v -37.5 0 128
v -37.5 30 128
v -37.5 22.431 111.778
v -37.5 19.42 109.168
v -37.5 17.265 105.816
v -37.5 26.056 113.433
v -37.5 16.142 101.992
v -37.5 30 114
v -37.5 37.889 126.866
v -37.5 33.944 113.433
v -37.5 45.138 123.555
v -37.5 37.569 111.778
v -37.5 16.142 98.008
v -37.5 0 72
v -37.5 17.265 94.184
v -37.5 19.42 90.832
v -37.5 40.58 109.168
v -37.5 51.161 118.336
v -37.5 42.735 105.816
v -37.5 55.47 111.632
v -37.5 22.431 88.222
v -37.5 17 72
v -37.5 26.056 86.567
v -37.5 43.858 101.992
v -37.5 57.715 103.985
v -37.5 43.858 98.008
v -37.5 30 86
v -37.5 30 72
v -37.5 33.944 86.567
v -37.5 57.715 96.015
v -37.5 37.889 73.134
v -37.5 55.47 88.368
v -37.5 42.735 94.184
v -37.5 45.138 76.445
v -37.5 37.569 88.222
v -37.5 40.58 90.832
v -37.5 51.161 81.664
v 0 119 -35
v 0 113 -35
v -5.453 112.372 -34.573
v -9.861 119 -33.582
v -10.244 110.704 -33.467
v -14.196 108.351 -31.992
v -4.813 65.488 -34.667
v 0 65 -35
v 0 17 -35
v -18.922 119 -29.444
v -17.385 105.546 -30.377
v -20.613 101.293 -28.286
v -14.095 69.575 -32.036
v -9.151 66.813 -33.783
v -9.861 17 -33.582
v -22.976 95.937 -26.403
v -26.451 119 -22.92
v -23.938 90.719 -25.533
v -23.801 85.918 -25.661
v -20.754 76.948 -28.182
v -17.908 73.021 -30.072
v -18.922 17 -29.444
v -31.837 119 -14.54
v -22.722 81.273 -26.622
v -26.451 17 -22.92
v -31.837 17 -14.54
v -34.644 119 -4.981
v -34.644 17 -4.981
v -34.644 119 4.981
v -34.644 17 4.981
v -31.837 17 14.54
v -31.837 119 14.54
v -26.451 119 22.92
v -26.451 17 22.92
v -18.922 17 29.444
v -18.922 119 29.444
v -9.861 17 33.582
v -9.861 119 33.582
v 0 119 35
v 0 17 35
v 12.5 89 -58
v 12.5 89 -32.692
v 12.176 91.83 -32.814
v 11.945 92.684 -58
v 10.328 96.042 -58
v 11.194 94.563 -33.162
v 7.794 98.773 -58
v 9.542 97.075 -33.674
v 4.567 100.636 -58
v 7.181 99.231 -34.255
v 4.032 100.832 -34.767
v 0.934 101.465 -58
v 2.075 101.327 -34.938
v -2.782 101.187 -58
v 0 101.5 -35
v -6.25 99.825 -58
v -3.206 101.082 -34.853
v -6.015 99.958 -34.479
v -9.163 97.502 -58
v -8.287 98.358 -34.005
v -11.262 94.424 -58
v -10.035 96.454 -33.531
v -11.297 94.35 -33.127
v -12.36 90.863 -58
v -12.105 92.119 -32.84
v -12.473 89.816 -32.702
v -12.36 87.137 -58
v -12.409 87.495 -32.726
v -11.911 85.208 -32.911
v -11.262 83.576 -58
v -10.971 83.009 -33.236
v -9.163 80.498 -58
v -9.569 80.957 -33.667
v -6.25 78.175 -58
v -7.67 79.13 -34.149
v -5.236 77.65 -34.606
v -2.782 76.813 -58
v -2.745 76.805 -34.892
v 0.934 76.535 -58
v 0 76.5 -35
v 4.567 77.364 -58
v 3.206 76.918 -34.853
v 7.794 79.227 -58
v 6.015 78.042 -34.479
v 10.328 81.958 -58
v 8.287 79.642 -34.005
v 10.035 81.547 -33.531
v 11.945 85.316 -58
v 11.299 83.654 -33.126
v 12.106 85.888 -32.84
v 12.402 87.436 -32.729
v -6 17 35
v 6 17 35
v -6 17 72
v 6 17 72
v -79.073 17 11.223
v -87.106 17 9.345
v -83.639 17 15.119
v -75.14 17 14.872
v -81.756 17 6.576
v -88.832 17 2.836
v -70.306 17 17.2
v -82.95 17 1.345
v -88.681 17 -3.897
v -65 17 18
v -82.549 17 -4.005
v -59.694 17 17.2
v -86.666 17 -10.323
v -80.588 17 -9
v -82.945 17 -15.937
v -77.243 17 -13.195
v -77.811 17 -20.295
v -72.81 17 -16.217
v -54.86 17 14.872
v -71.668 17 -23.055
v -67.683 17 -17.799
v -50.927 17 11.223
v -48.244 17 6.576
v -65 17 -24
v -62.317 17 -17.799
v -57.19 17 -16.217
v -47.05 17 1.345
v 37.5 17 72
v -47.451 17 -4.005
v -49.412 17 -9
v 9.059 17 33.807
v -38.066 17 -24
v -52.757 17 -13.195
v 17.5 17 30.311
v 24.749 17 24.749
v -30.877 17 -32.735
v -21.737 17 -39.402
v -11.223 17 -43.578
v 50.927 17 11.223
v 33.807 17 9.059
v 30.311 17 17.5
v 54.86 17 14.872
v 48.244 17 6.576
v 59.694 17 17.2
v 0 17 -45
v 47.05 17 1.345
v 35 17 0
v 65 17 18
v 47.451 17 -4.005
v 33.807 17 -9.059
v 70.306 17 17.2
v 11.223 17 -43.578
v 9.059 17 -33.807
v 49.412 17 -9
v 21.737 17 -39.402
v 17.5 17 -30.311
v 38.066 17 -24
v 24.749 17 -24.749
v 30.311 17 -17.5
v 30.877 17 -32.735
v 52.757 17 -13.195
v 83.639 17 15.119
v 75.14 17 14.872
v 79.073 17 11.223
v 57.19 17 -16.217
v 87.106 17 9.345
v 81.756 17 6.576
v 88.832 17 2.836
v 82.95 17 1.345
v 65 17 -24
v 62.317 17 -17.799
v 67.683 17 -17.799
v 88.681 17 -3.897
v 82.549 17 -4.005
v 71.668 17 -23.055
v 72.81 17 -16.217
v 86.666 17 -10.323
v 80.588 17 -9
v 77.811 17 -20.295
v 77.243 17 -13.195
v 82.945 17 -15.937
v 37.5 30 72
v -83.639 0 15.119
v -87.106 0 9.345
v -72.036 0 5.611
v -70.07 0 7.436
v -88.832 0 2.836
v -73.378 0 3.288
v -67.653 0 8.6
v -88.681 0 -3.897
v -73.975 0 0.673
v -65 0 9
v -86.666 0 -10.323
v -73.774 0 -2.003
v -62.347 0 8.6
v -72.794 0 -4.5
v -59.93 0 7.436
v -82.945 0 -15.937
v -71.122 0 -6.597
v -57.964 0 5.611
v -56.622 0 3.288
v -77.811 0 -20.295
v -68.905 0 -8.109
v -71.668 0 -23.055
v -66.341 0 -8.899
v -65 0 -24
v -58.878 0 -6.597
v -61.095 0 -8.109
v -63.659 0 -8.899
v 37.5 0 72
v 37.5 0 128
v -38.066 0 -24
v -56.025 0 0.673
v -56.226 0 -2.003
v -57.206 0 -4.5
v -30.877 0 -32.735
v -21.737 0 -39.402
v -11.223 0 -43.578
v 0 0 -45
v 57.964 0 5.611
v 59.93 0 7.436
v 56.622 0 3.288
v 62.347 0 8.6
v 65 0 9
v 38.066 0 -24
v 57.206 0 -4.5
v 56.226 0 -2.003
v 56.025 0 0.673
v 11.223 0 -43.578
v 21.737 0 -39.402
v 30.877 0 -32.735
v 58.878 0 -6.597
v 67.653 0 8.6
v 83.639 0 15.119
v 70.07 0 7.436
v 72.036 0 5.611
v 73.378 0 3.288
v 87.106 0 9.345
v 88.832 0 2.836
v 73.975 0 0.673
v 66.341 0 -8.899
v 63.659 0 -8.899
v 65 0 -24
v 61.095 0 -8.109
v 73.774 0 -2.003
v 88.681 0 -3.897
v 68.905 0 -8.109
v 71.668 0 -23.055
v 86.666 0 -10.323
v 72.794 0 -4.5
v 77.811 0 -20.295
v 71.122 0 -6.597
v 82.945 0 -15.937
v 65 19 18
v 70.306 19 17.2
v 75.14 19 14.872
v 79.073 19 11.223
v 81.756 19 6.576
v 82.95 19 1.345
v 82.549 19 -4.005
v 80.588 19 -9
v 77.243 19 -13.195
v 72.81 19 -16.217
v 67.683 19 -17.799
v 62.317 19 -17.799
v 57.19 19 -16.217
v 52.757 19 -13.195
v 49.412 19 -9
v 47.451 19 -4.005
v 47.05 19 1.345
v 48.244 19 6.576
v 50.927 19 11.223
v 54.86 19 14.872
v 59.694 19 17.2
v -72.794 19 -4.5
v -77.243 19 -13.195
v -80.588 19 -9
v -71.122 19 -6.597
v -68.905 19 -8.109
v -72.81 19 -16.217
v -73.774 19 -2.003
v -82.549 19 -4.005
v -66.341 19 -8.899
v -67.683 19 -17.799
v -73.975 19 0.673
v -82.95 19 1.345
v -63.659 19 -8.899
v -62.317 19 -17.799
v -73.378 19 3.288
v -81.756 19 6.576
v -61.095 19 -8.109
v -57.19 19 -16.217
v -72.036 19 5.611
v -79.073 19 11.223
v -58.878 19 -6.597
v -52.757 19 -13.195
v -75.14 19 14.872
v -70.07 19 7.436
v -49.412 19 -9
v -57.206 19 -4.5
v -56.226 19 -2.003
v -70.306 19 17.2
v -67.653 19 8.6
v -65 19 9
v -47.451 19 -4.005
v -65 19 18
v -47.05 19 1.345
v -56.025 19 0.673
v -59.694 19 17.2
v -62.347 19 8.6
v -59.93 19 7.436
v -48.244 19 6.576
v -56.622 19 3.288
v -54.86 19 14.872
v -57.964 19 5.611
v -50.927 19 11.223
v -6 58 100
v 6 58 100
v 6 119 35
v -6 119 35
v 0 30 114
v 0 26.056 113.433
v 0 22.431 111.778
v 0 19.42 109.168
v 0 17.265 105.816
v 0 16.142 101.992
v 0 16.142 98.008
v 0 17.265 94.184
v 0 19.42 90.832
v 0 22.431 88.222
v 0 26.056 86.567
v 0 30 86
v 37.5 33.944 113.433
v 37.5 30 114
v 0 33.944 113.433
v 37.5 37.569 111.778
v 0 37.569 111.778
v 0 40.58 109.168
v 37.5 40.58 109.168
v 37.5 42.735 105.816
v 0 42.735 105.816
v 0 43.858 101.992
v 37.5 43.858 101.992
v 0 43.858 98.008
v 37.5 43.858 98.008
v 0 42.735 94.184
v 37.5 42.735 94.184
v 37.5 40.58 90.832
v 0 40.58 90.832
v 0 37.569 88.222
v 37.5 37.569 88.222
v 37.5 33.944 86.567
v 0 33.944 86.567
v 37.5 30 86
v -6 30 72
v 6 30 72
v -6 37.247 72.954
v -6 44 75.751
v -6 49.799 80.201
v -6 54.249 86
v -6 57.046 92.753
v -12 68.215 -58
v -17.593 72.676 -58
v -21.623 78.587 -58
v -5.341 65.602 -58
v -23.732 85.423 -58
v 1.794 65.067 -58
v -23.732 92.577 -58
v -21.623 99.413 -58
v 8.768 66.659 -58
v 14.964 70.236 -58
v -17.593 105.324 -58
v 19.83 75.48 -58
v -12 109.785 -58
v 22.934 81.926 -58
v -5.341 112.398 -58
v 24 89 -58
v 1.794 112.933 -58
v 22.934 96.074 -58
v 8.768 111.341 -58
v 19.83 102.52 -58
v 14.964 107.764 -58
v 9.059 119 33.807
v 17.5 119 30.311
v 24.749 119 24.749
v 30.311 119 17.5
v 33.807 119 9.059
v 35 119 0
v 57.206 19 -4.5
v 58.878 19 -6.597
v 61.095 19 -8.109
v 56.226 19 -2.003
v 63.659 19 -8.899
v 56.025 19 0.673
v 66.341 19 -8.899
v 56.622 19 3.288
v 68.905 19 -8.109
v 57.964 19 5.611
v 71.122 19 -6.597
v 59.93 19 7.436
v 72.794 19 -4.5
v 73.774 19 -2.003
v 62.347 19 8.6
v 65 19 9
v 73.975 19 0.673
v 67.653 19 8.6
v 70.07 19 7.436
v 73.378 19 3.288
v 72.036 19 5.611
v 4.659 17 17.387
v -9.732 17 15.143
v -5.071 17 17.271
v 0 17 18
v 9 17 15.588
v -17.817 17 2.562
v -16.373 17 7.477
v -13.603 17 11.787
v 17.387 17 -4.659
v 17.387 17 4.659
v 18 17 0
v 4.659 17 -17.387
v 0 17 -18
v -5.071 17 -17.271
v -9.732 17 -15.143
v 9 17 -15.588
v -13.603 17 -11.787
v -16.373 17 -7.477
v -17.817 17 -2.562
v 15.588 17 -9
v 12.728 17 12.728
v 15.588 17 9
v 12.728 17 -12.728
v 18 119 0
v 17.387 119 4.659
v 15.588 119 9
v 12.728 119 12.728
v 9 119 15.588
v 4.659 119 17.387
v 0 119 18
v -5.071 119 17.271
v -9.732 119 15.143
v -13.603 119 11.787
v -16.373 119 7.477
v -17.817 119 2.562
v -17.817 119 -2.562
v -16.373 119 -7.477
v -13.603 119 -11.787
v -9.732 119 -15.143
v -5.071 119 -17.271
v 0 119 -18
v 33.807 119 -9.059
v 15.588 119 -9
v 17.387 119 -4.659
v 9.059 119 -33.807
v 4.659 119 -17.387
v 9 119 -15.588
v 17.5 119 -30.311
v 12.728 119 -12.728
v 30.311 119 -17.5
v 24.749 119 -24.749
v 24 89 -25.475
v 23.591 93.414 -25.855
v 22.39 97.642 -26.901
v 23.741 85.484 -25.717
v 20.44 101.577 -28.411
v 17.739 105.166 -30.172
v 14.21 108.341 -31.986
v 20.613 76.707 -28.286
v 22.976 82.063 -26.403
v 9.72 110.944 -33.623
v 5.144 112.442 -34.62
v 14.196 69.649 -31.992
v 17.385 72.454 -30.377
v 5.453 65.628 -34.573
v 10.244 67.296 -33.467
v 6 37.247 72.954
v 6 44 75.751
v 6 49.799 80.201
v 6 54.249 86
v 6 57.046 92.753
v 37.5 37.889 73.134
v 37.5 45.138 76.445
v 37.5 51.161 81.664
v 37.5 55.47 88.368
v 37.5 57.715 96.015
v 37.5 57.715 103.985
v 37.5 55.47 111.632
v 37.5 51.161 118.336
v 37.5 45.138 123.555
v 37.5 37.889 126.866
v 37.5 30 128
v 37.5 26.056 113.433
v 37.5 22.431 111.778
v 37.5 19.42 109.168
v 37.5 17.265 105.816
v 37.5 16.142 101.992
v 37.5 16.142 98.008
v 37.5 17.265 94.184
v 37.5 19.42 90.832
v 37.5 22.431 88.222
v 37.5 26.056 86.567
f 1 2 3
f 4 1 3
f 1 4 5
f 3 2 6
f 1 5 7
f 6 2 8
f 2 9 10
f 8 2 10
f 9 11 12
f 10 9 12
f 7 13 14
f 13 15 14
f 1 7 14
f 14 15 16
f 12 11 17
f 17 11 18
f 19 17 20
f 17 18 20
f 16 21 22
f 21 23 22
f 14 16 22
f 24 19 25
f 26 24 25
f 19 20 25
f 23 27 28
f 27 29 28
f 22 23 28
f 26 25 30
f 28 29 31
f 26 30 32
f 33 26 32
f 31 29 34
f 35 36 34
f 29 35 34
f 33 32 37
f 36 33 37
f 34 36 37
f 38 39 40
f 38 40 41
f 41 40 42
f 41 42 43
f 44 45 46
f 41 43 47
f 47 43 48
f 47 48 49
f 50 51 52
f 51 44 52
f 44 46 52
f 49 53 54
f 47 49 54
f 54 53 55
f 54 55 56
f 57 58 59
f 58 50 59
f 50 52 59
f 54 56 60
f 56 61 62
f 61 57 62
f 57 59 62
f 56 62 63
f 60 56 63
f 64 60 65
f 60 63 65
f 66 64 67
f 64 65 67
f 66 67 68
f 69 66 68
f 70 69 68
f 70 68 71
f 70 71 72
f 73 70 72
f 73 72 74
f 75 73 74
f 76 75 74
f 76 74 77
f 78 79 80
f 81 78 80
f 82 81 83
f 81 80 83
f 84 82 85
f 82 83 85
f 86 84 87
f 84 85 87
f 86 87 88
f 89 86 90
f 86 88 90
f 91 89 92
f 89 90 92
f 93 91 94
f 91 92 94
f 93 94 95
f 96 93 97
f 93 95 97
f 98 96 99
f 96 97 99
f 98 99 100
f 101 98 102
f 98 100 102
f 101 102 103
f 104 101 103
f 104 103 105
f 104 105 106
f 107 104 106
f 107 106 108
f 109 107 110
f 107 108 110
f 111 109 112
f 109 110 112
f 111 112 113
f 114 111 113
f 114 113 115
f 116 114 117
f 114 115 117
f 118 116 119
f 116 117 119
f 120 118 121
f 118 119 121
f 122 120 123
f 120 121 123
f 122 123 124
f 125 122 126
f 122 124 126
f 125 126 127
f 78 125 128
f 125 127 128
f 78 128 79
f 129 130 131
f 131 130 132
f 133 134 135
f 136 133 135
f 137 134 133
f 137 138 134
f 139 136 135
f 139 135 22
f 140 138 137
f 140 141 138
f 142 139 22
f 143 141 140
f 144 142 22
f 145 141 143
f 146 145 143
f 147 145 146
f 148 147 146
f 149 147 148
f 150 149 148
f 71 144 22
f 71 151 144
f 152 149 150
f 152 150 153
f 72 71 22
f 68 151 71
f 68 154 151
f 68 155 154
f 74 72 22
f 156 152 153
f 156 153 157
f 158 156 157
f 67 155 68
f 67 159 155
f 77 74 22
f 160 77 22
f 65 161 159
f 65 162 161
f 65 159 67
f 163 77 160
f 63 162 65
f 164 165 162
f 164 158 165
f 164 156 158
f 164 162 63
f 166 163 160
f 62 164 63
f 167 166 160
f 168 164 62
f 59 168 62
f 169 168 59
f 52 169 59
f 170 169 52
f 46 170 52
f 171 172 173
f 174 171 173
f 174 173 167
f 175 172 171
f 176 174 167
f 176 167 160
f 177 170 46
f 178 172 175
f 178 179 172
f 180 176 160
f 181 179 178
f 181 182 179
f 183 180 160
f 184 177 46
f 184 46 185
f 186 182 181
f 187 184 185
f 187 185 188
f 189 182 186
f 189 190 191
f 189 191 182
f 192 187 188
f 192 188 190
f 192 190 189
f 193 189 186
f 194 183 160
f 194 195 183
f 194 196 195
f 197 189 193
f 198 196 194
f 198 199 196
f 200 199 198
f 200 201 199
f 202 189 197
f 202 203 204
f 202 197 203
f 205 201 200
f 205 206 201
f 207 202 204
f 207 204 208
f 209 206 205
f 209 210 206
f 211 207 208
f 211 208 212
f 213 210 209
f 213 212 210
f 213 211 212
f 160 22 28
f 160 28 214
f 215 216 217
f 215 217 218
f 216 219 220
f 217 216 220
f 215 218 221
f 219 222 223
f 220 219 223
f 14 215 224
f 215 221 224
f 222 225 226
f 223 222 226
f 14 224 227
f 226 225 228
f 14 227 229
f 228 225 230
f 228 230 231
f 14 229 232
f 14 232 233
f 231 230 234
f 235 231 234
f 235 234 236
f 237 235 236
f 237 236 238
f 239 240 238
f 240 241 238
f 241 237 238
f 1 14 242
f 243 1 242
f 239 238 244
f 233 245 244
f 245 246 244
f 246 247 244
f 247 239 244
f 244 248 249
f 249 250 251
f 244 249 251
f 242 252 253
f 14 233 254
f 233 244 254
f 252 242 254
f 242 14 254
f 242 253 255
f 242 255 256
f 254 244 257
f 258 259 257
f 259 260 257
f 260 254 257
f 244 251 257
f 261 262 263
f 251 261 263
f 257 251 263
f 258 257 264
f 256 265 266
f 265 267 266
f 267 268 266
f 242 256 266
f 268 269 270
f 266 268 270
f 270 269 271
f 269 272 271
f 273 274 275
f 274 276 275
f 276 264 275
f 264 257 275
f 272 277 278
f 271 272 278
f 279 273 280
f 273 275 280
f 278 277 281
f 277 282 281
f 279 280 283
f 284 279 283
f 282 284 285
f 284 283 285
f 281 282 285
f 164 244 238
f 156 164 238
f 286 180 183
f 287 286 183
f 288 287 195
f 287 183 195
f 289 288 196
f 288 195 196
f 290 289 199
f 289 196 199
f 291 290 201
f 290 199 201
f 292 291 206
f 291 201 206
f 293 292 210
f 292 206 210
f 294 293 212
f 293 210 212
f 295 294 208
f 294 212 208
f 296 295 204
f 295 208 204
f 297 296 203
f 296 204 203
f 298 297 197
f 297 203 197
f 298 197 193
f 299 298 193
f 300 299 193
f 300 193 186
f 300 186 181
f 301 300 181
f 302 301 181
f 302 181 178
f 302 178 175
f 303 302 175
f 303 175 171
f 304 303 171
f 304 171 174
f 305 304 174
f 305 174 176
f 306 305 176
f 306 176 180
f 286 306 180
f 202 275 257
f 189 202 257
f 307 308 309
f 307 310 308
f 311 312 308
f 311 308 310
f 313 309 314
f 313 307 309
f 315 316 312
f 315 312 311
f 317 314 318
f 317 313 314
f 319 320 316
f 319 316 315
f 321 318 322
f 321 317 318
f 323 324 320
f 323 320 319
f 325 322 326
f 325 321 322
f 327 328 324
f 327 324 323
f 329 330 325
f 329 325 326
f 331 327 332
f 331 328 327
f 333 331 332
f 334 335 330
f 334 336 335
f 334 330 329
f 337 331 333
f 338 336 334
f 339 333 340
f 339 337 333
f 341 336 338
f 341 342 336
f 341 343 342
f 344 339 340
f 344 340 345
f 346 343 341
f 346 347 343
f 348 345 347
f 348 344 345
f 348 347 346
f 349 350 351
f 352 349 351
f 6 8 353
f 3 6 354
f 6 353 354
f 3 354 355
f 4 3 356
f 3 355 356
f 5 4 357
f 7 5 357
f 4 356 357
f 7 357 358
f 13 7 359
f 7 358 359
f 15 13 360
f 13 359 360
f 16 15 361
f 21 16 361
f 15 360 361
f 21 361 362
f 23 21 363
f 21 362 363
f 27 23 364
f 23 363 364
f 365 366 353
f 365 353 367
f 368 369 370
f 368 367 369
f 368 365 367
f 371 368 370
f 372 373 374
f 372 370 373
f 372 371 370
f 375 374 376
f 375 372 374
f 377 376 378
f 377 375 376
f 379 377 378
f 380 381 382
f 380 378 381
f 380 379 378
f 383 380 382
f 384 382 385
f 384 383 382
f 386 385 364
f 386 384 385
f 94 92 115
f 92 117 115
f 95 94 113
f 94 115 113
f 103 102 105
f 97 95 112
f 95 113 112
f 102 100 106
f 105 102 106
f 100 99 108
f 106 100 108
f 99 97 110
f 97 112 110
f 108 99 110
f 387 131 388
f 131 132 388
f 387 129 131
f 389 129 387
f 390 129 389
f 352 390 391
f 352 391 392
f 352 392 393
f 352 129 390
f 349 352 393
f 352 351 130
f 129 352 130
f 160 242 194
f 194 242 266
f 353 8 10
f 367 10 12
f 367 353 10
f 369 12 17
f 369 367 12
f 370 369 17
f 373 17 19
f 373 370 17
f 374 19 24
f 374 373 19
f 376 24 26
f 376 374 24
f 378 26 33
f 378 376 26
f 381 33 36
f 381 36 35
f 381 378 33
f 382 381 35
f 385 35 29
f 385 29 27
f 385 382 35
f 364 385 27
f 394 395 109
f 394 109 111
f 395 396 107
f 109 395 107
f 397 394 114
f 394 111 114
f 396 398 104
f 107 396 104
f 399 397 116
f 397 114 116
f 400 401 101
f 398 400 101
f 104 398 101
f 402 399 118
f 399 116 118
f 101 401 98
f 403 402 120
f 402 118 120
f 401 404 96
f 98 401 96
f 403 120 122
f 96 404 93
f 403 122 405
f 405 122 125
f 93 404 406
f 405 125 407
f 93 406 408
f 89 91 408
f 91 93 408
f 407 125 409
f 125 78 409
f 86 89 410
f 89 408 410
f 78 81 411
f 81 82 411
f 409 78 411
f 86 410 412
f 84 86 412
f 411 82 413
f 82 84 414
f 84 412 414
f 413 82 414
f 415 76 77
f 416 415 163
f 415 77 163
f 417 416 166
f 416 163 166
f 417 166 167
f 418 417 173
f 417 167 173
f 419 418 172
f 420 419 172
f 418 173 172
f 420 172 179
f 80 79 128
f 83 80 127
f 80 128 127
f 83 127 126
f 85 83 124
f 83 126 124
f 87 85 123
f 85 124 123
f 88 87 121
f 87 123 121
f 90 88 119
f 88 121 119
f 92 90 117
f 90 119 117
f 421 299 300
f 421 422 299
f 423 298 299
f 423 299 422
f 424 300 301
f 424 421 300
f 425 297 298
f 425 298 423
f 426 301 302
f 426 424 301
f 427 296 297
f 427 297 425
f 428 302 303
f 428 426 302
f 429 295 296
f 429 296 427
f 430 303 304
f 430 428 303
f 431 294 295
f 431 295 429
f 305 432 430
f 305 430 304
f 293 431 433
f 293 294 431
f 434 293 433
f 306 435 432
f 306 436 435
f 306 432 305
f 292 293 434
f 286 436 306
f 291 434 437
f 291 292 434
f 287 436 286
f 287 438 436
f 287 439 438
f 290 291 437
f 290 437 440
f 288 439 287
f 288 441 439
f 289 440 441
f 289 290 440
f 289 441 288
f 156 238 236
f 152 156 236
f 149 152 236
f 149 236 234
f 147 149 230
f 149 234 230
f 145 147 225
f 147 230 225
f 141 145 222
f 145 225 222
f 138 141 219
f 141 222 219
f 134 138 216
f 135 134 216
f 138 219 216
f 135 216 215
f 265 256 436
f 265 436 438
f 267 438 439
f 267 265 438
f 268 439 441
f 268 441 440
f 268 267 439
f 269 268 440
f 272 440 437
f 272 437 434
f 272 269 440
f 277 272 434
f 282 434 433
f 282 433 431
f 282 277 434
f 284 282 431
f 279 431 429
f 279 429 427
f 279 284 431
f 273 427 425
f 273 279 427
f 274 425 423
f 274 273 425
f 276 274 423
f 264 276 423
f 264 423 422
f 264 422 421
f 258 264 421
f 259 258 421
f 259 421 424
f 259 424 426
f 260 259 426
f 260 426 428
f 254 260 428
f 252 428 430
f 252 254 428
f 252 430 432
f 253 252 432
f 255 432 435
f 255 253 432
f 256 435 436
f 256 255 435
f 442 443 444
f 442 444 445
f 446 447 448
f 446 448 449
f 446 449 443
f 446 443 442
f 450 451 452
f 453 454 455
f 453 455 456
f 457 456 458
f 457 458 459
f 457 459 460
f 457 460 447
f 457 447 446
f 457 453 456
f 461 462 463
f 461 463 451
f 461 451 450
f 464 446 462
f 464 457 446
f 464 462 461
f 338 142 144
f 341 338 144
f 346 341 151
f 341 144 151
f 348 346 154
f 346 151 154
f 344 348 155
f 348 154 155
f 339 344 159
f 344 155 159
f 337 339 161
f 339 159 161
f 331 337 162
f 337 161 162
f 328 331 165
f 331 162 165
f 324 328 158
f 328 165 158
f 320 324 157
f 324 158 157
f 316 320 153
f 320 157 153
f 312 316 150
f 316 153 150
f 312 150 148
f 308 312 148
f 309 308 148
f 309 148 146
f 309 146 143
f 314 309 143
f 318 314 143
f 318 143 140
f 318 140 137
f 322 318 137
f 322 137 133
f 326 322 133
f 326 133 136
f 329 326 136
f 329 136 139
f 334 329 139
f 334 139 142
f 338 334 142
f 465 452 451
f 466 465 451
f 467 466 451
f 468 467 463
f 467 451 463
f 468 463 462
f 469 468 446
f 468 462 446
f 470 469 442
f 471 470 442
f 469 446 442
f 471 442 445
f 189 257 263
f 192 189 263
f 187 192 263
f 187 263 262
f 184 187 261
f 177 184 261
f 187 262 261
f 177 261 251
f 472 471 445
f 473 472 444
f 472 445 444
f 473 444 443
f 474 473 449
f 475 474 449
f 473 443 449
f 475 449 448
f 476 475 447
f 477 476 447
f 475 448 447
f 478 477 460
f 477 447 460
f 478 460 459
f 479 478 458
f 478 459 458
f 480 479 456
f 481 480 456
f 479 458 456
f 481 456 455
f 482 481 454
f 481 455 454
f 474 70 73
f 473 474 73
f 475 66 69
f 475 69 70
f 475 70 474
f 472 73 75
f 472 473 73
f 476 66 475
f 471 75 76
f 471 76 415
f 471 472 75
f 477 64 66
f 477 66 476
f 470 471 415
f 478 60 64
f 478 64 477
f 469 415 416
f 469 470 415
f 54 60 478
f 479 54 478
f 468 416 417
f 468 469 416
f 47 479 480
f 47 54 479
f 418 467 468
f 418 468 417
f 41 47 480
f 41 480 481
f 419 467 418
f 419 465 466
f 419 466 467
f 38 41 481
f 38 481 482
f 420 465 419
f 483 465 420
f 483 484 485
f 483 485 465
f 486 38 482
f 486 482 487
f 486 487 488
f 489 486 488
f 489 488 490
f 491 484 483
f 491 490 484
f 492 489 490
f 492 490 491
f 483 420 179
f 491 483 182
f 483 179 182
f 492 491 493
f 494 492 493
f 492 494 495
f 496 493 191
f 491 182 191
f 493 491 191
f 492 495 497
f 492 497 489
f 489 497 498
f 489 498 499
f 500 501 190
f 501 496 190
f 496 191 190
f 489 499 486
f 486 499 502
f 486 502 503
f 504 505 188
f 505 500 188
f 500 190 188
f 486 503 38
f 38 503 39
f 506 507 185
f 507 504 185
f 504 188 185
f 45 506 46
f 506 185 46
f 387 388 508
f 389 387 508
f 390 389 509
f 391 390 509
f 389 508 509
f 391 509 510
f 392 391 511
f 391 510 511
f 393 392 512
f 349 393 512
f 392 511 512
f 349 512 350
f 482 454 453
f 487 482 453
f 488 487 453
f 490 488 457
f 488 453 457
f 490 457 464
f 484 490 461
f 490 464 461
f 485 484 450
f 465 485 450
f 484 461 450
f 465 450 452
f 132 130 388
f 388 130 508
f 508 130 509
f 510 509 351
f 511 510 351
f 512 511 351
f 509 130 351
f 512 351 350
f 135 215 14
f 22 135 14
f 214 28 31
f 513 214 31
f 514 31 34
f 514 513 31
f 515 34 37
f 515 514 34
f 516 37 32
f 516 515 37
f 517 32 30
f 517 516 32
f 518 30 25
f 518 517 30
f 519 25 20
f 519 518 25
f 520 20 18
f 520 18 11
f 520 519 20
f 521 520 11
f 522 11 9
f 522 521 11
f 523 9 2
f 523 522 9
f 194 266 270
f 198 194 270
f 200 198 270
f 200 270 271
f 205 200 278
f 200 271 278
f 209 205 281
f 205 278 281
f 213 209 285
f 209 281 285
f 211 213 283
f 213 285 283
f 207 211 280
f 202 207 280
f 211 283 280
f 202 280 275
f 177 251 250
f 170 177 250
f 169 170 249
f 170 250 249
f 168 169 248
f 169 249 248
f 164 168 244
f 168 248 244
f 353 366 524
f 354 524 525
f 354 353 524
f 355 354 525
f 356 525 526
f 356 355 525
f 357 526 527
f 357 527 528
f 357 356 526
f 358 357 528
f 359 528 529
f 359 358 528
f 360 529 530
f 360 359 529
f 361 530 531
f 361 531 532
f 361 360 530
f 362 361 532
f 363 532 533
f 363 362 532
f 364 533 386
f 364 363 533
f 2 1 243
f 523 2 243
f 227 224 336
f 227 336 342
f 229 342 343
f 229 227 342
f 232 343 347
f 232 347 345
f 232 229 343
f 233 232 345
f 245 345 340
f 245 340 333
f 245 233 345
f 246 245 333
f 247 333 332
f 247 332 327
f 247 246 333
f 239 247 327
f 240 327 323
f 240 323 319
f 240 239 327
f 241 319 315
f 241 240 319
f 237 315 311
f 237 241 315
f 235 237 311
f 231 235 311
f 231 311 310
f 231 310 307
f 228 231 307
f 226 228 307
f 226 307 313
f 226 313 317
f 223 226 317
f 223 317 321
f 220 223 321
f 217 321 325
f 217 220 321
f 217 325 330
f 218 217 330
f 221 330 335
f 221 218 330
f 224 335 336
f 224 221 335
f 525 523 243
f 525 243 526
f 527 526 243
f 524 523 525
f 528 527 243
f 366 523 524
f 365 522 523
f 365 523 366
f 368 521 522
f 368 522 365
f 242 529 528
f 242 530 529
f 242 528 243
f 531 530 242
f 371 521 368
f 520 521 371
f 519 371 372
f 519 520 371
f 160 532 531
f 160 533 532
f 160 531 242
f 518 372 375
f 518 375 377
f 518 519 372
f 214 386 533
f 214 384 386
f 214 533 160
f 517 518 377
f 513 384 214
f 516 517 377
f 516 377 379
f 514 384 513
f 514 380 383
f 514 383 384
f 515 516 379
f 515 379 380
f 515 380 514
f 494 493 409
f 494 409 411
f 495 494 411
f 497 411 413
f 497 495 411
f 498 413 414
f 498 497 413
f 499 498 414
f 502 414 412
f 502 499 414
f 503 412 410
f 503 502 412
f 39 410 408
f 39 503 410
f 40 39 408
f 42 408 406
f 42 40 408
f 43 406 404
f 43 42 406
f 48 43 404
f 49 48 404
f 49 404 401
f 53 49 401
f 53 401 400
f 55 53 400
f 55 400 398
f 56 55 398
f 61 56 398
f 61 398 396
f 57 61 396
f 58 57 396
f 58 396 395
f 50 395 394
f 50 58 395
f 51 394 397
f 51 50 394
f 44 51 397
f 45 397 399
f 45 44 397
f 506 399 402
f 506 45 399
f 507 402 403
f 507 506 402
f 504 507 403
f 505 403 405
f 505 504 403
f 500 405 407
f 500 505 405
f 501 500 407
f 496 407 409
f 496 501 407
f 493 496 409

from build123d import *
from build123d.topology import SkipClean

# Parameters (mm, degrees)
SKETCH1_R             = 35
SKETCH1_R_2           = 18
BOSS_EXTRUDE1_DEPTH   = 17
BOSS_EXTRUDE1_2_DEPTH = 17
SKETCH1_4_R           = 18
SKETCH1_4_R_2         = 9
BOSS_EXTRUDE2_DEPTH   = 19
SKETCH1_6_R           = 35
SKETCH1_6_R_2         = 18
BOSS_EXTRUDE3_DEPTH   = 119
BOSS_EXTRUDE4_START   = -18
SKETCH4_R             = 24
SKETCH4_R_2           = 12.5
BOSS_EXTRUDE4_DEPTH   = 40
SKETCH5_W             = 75
SKETCH5_H             = 56
BOSS_EXTRUDE5_DEPTH   = 30
BOSS_EXTRUDE6_DEPTH   = 37.5
SKETCH6_3_R           = 14
CUT_EXTRUDE2_DEPTH    = 37.5
BOSS_EXTRUDE14_DEPTH  = 6


with BuildPart() as part:
    # Sketch1 → Boss-Extrude1 (new body)
    with BuildSketch(Plane(origin=(0, 0, 0), x_dir=(1, 0, 0), z_dir=(0, 1, 0))):
        with BuildLine():
            ThreePointArc((38.065732621, 24), (0, 45), (-38.065732621, 24))
            Line((-38.065732621, 24), (-65, 24))
            ThreePointArc((-65, 24), (-86.666308011, 10.323327815), (-83.639033344, -15.119075236))
            Line((-83.639033344, -15.119075236), (-37.5, -72))
            Line((-37.5, -72), (37.5, -72))
            Line((37.5, -72), (83.639033344, -15.119075236))
            ThreePointArc((83.639033344, -15.119075236), (86.666308011, 10.323327815), (65, 24))
            Line((65, 24), (38.065732621, 24))
        make_face()
        Circle(SKETCH1_R, mode=Mode.SUBTRACT)
        with Locations((65, 0)):
            Circle(SKETCH1_R_2, mode=Mode.SUBTRACT)
        with Locations((-65, 0)):
            Circle(SKETCH1_R_2, mode=Mode.SUBTRACT)
    extrude(amount=BOSS_EXTRUDE1_DEPTH)

    # Sketch1<4> → Boss-Extrude2 (add)
    # profile 1 of 2: a face of its own
    with BuildSketch(Plane(origin=(0, 0, 0), x_dir=(1, 0, 0), z_dir=(0, 1, 0))):
        with Locations((-65, 0)):
            Circle(SKETCH1_4_R)
        with Locations((-65, 0)):
            Circle(SKETCH1_4_R_2, mode=Mode.SUBTRACT)
    # profile 2 of 2: a face of its own
    with BuildSketch(Plane(origin=(0, 0, 0), x_dir=(1, 0, 0), z_dir=(0, 1, 0))):
        with Locations((65, 0)):
            Circle(SKETCH1_4_R)
        with Locations((65, 0)):
            Circle(SKETCH1_4_R_2, mode=Mode.SUBTRACT)
    extrude(amount=BOSS_EXTRUDE2_DEPTH)



with BuildPart() as body_2:
    # Sketch1 → Boss-Extrude1 2 (new body)
    with BuildSketch(Plane(origin=(0, 0, 0), x_dir=(1, 0, 0), z_dir=(0, 1, 0))):
        Circle(SKETCH1_R_2)
    extrude(amount=BOSS_EXTRUDE1_2_DEPTH)


with BuildPart() as part_1:
    add(part.part)

    add(body_2.part)  # Boss-Extrude3 merges body 2
    # Sketch1<6> → Boss-Extrude3 (add)
    with BuildSketch(Plane(origin=(0, 0, 0), x_dir=(1, 0, 0), z_dir=(0, 1, 0))):
        Circle(SKETCH1_6_R)
        Circle(SKETCH1_6_R_2, mode=Mode.SUBTRACT)
    extrude(amount=BOSS_EXTRUDE3_DEPTH)

    # Sketch4 → Boss-Extrude4 (add)
    with BuildSketch(Plane.XY.offset(BOSS_EXTRUDE4_START)):
        with Locations((0, 89)):
            Circle(SKETCH4_R)
        with Locations((0, 89)):
            Circle(SKETCH4_R_2, mode=Mode.SUBTRACT)
    extrude(amount=-BOSS_EXTRUDE4_DEPTH)

    # Sketch5 → Boss-Extrude5 (add)
    with BuildSketch(Plane(origin=(0, 0, 0), x_dir=(1, 0, 0), z_dir=(0, 1, 0))):
        with Locations((0, -100)):
            Rectangle(SKETCH5_W, SKETCH5_H)
    extrude(amount=BOSS_EXTRUDE5_DEPTH)

    # Sketch6 → Boss-Extrude6 (add, symmetric)
    with BuildSketch(Plane(origin=(0, 0, 0), x_dir=(0, 0, -1), z_dir=(1, 0, 0))):
        with BuildLine():
            ThreePointArc((-114, 30), (-100, 44), (-86, 30))
            Line((-86, 30), (-72, 30))
            ThreePointArc((-72, 30), (-100, 58), (-128, 30))
            Line((-128, 30), (-114, 30))
        make_face()
    extrude(amount=BOSS_EXTRUDE6_DEPTH, both=True)

    # Sketch6<3> → Cut-Extrude2 (cut, symmetric)
    with SkipClean():  # the faces are left unmerged after this step: merging them gives an invalid solid
        with BuildSketch(Plane(origin=(0, 0, 0), x_dir=(0, 0, -1), z_dir=(1, 0, 0))):
            with Locations((-100, 30)):
                Circle(SKETCH6_3_R)
        extrude(amount=CUT_EXTRUDE2_DEPTH, both=True, mode=Mode.SUBTRACT)


with BuildPart() as body_2_2:
    # Sketch9 → Boss-Extrude14 (new, symmetric)
    with BuildSketch(Plane(origin=(0, 0, 0), x_dir=(0, 0, -1), z_dir=(1, 0, 0))):
        with BuildLine():
            Line((-35, 119), (-35, 17))
            Line((-35, 17), (-72, 17))
            Line((-72, 17), (-72, 30))
            ThreePointArc((-72, 30), (-80.201010127, 49.798989873), (-100, 58))
            Line((-100, 58), (-35, 119))
        make_face()
    extrude(amount=BOSS_EXTRUDE14_DEPTH, both=True)


solid = Compound([part_1.part, body_2_2.part])
